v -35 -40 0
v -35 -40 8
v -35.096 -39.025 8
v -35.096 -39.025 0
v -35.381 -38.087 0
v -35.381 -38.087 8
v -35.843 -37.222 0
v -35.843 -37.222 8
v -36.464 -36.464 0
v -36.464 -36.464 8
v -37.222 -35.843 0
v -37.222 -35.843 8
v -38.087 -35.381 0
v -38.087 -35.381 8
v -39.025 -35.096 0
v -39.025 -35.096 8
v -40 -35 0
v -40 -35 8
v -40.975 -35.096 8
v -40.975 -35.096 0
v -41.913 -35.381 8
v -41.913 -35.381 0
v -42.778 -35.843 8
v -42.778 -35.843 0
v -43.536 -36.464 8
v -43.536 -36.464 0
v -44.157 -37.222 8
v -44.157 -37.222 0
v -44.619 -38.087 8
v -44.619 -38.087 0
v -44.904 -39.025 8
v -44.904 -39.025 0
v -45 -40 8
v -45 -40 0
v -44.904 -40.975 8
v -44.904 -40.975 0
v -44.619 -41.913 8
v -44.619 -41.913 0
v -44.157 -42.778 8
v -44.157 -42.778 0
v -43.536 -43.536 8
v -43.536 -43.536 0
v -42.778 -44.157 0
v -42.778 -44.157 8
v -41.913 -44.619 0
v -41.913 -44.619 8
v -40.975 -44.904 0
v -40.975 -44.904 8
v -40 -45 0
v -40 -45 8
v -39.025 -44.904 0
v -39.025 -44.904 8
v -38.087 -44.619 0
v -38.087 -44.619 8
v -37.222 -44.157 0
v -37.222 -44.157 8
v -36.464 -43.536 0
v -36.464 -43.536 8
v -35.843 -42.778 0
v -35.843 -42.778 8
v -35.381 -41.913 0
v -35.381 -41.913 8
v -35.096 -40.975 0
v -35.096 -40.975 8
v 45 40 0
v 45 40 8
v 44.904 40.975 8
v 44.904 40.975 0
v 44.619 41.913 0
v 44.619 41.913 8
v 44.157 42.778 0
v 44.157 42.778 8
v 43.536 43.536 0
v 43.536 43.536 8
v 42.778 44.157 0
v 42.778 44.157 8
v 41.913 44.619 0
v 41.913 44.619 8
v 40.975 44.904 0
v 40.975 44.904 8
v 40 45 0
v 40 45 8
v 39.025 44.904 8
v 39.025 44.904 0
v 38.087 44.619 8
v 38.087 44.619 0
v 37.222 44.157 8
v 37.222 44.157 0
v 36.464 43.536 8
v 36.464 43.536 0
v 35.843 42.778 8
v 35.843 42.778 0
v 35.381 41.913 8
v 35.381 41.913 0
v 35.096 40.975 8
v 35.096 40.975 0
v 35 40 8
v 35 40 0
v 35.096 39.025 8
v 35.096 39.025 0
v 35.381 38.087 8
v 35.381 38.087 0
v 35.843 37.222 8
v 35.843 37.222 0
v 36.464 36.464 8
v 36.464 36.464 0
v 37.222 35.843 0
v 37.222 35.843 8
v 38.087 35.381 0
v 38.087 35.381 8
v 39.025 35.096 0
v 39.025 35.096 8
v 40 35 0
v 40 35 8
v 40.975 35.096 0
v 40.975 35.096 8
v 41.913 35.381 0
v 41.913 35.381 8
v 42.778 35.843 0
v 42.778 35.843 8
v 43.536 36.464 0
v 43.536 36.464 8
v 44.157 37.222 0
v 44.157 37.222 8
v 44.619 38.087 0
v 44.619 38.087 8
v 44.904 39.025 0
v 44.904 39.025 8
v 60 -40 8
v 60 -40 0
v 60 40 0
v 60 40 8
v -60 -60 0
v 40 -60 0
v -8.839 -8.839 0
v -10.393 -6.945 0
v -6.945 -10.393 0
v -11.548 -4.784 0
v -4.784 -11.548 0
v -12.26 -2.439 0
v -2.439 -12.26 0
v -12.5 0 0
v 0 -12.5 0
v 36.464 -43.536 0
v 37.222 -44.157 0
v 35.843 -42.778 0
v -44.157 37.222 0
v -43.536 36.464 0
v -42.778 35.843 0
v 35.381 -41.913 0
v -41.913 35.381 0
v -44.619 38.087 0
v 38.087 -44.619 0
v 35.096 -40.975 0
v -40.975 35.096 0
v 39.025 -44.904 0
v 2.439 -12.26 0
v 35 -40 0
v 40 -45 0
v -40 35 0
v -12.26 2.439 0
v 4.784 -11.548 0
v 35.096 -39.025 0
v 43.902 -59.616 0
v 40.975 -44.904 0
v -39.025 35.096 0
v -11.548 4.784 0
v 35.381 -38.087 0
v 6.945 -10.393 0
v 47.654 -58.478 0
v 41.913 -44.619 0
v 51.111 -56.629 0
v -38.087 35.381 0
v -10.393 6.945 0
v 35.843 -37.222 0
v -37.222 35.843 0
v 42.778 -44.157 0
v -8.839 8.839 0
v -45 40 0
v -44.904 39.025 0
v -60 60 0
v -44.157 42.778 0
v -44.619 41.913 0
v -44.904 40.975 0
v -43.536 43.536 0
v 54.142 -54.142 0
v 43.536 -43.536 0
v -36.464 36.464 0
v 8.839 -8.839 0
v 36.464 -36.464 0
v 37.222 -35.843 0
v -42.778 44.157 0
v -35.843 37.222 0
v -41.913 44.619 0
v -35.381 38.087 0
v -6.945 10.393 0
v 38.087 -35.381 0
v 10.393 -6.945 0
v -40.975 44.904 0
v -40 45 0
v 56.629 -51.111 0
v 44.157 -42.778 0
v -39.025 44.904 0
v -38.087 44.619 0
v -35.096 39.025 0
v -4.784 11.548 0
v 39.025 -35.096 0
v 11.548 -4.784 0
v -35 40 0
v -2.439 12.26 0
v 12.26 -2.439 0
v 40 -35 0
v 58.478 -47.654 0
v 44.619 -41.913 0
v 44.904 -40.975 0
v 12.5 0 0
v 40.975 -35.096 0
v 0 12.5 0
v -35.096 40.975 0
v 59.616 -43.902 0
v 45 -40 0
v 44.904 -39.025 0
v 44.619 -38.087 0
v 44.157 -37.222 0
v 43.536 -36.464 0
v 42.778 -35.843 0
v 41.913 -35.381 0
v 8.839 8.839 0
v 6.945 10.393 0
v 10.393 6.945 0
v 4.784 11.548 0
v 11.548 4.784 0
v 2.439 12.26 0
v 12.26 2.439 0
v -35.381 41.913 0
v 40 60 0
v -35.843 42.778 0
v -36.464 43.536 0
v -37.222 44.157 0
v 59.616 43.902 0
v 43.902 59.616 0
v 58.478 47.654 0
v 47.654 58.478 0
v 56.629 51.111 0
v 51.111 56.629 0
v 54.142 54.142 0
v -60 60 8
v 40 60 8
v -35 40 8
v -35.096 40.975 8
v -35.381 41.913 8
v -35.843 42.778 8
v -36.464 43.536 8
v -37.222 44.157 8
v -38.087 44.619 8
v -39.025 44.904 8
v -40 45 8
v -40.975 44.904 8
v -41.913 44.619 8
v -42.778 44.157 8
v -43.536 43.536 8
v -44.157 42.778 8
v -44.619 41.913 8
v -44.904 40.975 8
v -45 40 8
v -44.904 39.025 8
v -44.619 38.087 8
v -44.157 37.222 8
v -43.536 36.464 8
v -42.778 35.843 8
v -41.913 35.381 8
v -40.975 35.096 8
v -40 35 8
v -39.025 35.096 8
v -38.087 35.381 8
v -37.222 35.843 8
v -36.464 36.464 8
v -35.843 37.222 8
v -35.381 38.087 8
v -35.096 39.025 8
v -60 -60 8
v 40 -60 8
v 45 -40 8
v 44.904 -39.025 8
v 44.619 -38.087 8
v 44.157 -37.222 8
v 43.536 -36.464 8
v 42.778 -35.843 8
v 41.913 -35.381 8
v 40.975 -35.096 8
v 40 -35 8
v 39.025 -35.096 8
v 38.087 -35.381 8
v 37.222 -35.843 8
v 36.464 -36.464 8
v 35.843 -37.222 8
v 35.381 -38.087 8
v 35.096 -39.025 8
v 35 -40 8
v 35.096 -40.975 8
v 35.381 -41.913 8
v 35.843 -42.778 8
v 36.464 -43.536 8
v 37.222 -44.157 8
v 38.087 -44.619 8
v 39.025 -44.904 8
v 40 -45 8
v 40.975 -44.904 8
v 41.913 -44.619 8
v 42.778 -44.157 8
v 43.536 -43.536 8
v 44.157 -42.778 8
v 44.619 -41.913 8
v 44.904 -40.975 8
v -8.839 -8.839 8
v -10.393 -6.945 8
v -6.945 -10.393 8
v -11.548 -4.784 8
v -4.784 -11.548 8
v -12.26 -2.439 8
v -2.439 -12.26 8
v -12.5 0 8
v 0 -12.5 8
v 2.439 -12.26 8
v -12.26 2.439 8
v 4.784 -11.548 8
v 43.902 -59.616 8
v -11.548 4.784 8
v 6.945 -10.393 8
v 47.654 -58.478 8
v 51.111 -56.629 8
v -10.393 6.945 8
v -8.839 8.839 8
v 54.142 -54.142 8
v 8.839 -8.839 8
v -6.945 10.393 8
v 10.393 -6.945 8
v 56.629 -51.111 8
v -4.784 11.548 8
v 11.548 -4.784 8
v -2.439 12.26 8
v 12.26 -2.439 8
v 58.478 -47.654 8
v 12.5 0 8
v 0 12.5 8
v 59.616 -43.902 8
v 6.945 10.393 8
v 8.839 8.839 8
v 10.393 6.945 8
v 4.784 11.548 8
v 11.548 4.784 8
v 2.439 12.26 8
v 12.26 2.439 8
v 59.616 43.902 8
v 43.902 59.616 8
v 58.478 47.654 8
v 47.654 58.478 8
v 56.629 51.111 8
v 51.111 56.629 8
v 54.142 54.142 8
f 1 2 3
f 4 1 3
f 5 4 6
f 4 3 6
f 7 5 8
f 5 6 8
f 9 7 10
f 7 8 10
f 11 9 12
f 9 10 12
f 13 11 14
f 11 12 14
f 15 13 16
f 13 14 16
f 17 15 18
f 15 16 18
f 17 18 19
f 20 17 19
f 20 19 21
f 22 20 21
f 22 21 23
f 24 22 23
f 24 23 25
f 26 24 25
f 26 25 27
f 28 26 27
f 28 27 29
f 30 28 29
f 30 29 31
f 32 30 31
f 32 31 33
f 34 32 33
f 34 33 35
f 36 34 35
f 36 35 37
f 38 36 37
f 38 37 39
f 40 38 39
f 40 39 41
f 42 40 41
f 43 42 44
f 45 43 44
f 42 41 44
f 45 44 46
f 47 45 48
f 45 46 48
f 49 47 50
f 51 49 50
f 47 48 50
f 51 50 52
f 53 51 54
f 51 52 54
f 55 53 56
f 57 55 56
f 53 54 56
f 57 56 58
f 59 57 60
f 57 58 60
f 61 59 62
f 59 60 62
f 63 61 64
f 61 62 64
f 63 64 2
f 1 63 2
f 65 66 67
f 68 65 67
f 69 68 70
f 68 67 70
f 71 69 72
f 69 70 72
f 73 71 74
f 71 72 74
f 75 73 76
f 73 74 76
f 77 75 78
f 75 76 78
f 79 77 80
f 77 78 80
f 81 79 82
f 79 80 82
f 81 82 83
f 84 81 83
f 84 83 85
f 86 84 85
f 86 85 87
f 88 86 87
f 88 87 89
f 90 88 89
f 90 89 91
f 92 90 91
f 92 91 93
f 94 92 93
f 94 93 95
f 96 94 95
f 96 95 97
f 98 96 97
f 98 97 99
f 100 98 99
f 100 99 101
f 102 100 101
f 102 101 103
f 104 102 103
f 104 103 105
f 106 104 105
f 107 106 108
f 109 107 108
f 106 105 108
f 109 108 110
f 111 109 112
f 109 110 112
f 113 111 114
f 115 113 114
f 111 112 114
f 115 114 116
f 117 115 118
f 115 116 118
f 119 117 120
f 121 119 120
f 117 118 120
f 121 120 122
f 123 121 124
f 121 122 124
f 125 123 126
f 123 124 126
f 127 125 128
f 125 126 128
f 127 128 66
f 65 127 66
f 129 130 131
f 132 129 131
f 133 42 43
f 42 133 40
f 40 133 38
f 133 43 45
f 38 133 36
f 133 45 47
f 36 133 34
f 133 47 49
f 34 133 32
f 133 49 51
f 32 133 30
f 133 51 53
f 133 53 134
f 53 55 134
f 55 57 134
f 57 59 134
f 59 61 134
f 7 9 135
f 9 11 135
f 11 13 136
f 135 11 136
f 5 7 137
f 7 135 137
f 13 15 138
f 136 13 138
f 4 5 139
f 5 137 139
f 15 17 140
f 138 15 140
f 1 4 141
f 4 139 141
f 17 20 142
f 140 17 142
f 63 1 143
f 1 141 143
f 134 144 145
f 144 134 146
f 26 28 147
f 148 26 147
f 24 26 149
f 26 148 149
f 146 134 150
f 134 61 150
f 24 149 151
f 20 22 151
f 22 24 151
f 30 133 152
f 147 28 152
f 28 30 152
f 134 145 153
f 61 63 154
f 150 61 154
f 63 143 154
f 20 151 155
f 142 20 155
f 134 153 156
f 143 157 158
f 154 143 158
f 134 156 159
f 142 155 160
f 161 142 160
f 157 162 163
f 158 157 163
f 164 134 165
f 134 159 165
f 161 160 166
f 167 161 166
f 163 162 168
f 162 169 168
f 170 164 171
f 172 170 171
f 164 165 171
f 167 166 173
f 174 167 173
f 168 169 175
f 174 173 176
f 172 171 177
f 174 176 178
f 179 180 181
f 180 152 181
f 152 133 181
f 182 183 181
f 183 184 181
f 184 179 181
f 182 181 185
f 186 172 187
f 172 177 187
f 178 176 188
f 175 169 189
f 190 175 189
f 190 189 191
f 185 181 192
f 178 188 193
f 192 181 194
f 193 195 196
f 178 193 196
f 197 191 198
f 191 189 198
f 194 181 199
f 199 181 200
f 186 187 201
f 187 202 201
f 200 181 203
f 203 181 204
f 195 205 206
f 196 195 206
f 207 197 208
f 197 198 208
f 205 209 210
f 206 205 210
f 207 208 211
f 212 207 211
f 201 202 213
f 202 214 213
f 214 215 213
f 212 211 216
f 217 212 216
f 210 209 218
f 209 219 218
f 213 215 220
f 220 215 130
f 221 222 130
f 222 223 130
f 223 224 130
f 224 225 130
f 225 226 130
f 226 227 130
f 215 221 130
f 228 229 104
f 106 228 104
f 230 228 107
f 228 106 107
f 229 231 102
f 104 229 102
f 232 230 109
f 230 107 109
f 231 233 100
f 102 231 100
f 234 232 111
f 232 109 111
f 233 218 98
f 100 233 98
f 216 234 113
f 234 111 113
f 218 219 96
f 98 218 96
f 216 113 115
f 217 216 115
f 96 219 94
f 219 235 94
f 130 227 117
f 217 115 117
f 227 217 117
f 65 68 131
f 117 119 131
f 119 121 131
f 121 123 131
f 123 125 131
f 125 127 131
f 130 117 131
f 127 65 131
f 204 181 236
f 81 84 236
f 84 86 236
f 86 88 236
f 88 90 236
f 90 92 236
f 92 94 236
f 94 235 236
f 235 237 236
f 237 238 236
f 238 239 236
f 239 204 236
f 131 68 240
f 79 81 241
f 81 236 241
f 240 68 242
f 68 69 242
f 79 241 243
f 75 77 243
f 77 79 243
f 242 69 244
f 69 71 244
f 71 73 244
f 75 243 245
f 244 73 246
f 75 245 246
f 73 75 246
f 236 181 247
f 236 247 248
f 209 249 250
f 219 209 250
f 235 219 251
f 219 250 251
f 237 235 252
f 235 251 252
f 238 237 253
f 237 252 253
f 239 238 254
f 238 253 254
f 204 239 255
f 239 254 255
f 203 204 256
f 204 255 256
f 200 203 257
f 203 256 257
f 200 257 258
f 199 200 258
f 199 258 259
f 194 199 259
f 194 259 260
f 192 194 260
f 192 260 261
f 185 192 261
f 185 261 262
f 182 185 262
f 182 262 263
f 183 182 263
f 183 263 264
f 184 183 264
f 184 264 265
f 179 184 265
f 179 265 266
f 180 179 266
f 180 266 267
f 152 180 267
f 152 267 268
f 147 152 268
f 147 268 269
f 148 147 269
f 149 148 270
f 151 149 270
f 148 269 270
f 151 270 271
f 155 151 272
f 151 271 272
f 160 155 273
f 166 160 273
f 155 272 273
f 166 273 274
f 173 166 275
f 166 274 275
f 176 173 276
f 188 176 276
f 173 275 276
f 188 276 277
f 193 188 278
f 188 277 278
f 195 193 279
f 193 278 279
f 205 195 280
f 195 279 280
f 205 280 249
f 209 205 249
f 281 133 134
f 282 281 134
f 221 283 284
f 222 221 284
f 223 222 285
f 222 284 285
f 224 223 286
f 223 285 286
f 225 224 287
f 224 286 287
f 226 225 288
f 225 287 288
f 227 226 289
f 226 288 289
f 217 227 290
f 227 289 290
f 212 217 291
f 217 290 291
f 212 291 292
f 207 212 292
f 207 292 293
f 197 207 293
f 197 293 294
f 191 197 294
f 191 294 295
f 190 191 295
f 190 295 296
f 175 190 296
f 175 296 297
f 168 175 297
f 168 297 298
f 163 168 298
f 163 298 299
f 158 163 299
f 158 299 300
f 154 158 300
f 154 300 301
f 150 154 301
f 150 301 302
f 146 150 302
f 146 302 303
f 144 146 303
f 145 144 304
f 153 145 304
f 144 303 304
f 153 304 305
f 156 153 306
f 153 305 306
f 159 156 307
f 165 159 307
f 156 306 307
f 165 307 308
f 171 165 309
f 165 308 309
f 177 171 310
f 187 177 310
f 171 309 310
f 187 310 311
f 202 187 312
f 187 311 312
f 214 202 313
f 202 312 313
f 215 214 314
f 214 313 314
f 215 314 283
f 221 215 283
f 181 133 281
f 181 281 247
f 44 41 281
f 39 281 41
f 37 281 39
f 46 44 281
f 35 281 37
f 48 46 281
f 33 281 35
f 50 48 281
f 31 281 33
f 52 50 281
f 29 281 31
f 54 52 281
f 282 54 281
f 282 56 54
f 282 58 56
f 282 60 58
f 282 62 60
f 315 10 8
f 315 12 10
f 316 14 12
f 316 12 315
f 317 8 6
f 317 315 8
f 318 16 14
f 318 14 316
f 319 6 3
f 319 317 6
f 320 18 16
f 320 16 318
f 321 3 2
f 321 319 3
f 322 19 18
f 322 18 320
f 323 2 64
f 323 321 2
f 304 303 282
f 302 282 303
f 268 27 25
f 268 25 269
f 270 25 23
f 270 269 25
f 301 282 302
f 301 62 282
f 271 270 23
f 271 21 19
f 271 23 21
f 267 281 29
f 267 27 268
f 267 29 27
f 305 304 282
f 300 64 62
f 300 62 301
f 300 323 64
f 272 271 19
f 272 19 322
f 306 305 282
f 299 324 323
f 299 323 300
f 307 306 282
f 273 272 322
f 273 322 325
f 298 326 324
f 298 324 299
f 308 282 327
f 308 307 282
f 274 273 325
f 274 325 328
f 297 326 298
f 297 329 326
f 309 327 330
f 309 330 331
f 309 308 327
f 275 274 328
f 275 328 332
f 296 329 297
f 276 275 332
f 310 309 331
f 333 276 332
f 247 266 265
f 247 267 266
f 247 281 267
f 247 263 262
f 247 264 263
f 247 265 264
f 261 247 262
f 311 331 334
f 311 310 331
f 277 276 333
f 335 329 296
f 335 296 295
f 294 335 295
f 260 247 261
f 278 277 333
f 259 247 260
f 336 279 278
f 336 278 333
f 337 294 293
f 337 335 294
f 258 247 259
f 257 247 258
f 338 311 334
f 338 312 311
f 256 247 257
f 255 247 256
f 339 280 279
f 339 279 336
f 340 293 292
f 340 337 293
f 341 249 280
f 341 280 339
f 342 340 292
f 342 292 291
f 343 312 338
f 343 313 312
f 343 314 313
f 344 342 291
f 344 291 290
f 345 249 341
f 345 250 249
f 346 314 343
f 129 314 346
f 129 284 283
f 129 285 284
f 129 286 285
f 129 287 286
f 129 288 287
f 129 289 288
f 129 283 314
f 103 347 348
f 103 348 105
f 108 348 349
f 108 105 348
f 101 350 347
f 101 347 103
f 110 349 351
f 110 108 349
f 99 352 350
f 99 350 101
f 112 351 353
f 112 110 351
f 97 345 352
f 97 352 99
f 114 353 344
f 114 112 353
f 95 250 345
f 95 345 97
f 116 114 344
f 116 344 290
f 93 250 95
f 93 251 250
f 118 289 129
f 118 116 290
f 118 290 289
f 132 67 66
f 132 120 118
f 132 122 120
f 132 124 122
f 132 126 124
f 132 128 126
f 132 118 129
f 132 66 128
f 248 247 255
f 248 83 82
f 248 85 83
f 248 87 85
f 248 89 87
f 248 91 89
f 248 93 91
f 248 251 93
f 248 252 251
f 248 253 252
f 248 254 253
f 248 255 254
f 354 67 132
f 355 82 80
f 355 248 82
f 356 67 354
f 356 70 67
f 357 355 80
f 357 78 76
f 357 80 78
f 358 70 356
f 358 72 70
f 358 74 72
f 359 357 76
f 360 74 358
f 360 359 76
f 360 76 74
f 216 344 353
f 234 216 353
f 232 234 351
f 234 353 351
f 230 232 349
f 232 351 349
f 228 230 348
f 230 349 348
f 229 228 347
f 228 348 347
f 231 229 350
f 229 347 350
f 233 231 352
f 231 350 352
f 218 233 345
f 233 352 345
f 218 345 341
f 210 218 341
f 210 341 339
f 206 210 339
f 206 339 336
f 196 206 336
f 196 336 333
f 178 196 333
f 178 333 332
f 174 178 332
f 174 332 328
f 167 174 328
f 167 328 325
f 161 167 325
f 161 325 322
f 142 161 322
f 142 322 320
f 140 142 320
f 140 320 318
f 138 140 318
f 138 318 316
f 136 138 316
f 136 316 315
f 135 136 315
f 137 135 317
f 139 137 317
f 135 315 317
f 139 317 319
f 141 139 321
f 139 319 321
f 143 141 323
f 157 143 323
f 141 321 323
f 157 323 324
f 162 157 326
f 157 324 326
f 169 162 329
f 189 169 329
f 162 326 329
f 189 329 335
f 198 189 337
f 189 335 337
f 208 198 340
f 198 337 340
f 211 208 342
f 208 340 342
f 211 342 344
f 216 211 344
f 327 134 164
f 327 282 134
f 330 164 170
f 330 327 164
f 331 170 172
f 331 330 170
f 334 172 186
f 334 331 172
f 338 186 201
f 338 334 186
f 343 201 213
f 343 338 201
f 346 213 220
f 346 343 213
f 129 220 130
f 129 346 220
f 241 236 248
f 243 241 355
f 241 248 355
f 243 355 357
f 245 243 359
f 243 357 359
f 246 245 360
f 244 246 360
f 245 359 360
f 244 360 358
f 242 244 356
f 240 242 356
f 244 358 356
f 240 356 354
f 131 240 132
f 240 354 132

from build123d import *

# Parameters (mm, degrees)
SKETCH2_W            = 120
SKETCH2_H            = 120
BOSS_EXTRUDE1_DEPTH  = 8
SKETCH4_R            = 12.5
CUT_EXTRUDE1_DEPTH   = 86.229103011
SKETCH6_R            = 5
CUT_EXTRUDE2_DEPTH   = 86.229103011
LPATTERN1_COUNT      = 2
LPATTERN1_PITCH      = 80
LPATTERN1_COUNT_DIR2 = 2
LPATTERN1_PITCH_DIR2 = 80
FILLET2_R            = 20


with BuildPart() as part:
    # Sketch2 → Boss-Extrude1 (new body)
    with BuildSketch(Plane.XY):
        Rectangle(SKETCH2_W, SKETCH2_H)
    extrude(amount=BOSS_EXTRUDE1_DEPTH)

    # Sketch4 → Cut-Extrude1 (cut, through all)
    with BuildSketch(Plane.XY.offset(8)):
        Circle(SKETCH4_R)
    extrude(amount=-CUT_EXTRUDE1_DEPTH, mode=Mode.SUBTRACT)

    # Sketch6 → Cut-Extrude2 (cut, through all)
    with BuildSketch(Plane.XY.offset(8)):
        with Locations((-40, 40)):
            Circle(SKETCH6_R)
    cut_extrude2 = extrude(amount=-CUT_EXTRUDE2_DEPTH, mode=Mode.SUBTRACT)

    # LPattern1: Cut-Extrude2 2 × 2
    with Locations(*[(i * LPATTERN1_PITCH, -j * LPATTERN1_PITCH_DIR2, 0) for i in range(LPATTERN1_COUNT) for j in range(LPATTERN1_COUNT_DIR2) if (i, j) != (0, 0)]):
        add(cut_extrude2, mode=Mode.SUBTRACT)

    # Fillet2
    fillet2_edges = [part.edges().sort_by_distance(p)[0] for p in [
        (60, -60, 4),
        (60, 60, 4),
    ]]
    fillet(fillet2_edges, radius=FILLET2_R)


solid = part.part
